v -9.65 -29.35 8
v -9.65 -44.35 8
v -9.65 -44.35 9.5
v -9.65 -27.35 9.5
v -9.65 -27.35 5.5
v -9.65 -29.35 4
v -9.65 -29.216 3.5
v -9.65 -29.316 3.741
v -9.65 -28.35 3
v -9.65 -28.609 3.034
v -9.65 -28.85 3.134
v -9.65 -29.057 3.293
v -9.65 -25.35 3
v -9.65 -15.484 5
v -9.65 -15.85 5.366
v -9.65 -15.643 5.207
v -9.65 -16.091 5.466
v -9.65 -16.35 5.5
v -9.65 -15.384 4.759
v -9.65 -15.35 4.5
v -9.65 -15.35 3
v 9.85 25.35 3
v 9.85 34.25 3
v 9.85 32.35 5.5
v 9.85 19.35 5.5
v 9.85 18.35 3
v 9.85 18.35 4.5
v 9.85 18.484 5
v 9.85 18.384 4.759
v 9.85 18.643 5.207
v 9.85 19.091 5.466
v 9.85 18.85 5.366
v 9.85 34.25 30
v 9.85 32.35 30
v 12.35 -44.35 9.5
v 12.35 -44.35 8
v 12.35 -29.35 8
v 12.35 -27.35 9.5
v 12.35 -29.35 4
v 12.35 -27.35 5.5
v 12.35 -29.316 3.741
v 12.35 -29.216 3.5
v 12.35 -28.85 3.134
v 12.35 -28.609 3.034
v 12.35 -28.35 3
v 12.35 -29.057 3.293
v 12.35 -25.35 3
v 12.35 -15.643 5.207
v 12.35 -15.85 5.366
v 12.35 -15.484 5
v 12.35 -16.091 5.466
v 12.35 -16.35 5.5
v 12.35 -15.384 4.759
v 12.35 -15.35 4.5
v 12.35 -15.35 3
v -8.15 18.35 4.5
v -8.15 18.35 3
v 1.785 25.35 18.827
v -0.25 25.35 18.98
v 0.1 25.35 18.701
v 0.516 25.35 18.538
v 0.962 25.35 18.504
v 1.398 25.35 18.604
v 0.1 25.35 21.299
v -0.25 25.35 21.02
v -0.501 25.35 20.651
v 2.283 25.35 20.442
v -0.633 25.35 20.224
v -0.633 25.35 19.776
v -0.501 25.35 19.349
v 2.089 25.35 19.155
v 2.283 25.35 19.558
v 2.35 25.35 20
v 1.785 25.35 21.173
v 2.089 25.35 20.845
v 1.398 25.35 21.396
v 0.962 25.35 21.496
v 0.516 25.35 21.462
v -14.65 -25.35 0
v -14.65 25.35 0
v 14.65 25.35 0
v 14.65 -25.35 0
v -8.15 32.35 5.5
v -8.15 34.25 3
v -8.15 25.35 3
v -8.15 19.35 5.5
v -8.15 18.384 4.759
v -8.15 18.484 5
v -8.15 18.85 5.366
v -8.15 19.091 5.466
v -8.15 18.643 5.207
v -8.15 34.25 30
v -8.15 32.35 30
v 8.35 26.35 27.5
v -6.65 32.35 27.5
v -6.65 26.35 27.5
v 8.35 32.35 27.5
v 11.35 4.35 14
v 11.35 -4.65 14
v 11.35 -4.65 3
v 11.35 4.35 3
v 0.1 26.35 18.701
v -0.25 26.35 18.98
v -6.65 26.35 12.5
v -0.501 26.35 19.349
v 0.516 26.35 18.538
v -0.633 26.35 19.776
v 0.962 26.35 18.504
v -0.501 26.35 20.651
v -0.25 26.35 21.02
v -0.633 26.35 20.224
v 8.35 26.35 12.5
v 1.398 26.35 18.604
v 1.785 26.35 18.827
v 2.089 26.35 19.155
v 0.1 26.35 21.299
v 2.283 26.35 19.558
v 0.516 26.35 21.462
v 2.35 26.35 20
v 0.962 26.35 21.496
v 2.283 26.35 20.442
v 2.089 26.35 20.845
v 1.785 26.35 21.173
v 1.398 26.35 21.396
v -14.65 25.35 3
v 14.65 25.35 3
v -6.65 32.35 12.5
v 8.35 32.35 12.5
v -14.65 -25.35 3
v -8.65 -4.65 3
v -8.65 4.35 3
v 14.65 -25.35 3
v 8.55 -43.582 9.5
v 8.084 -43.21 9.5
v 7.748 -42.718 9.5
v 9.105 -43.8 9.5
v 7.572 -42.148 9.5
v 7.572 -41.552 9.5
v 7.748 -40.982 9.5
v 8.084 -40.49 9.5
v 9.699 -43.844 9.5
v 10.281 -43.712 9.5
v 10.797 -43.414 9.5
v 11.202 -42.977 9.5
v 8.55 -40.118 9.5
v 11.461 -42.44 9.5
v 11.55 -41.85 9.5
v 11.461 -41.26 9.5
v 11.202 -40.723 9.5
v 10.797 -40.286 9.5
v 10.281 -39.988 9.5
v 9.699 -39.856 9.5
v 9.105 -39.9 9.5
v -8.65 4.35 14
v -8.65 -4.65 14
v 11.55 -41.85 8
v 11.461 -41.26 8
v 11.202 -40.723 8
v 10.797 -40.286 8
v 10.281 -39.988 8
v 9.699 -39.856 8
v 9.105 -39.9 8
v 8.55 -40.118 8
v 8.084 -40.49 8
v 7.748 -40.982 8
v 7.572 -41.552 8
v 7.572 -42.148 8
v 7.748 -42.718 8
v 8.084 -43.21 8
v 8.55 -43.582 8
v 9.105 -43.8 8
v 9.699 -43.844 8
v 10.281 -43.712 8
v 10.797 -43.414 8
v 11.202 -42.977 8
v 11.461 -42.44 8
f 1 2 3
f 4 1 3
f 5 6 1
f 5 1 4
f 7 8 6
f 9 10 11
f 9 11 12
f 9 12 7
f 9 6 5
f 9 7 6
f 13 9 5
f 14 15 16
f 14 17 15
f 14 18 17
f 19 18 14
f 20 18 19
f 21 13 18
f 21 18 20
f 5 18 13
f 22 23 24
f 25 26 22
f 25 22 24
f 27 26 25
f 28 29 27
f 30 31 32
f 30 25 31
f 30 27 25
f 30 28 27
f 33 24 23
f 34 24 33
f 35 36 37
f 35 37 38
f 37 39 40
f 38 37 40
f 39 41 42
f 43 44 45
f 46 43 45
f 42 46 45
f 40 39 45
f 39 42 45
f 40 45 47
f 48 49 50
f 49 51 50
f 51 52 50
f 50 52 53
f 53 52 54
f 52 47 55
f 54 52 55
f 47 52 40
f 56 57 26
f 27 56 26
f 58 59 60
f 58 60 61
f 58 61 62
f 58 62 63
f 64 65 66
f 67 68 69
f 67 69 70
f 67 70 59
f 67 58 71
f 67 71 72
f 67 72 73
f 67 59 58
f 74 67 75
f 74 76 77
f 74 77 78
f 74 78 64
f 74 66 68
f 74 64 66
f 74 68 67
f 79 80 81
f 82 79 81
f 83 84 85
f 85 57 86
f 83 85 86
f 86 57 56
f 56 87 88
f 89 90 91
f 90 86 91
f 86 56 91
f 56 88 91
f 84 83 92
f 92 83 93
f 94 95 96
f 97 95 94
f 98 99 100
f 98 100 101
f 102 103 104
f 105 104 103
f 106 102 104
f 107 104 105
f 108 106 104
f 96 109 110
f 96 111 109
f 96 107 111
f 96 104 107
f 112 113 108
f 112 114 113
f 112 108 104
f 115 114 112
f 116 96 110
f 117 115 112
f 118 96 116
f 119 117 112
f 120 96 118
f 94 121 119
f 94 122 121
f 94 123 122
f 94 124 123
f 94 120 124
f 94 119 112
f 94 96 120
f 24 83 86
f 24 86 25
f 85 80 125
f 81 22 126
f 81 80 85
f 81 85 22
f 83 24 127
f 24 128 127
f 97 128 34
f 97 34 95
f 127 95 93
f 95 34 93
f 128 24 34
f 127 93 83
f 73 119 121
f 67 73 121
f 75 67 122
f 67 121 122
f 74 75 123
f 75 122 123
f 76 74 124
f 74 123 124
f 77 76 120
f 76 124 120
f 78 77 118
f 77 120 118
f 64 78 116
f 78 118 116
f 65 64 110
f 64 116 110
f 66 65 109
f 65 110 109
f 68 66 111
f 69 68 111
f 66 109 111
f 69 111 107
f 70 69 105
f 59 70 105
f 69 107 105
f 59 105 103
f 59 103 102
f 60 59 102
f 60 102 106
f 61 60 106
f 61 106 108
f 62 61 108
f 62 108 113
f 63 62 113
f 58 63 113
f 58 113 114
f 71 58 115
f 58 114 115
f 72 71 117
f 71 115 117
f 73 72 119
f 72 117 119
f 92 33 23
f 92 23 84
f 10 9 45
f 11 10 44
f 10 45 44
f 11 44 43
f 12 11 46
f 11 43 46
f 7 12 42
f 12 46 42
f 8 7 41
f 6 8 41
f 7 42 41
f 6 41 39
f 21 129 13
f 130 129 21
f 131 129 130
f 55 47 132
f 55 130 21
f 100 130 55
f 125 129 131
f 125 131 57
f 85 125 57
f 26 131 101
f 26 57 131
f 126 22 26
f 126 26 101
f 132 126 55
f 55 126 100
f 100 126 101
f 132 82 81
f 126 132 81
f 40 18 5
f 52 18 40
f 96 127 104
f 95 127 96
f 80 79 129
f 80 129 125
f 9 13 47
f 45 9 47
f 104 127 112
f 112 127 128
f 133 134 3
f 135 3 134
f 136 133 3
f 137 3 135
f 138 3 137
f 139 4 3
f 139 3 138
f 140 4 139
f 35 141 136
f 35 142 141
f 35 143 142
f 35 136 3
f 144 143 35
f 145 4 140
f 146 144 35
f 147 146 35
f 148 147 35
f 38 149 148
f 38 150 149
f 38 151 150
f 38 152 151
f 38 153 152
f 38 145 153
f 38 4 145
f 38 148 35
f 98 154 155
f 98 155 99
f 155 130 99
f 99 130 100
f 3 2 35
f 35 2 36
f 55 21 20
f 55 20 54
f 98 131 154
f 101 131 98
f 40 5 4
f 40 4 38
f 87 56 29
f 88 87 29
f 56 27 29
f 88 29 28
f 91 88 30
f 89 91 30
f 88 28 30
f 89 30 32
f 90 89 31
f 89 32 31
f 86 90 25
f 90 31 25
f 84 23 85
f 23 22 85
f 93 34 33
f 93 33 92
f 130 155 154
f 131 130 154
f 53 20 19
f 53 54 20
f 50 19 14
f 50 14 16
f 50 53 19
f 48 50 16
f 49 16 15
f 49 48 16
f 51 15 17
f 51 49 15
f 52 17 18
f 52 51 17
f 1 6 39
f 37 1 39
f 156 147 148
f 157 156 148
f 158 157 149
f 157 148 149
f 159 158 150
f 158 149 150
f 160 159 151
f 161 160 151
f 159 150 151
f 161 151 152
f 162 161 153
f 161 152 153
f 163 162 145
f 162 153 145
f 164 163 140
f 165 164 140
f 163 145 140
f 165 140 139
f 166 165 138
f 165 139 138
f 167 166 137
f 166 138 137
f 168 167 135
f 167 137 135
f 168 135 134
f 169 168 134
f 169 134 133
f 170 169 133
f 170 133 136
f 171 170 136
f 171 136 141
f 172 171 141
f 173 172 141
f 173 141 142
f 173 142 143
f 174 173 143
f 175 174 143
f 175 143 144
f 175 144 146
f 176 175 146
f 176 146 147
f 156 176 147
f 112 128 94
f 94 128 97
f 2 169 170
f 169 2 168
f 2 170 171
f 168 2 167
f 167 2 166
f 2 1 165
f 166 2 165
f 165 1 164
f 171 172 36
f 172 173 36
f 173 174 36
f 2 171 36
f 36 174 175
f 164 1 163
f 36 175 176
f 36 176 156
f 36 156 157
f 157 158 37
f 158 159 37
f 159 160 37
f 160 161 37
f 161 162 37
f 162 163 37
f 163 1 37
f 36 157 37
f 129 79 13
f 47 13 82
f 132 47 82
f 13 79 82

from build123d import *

# Parameters (mm, degrees)
SKETCH_W      = 29.3
SKETCH_H      = 50.7
PAD_DEPTH     = 3
SKETCH001_W   = 18
SKETCH001_H   = 14
SKETCH001_W_2 = 22
PAD001_DEPTH  = 2.5
FILLET_R      = 1
SKETCH002_W   = 18
SKETCH002_H   = 27
PAD002_DEPTH  = 1.9
SKETCH003_W   = 15
SKETCH003_H   = 15
PAD003_DEPTH  = 6
SKETCH004_R   = 1.5
PAD004_DEPTH  = 1
SKETCH005_W   = 22
SKETCH005_H   = 2
PAD005_DEPTH  = 2.5
SKETCH006_W   = 22
SKETCH006_H   = 17
PAD006_DEPTH  = 1.5
SKETCH007_R   = 2
POCKET_DEPTH  = 5
SKETCH008_W   = 20
SKETCH008_H   = 9
PAD007_DEPTH  = 11
FILLET001_R   = 1


with BuildPart() as part:
    # Sketch → Pad (new body)
    with BuildSketch(Plane.XY):
        Rectangle(SKETCH_W, SKETCH_H)
    extrude(amount=PAD_DEPTH)

    # Sketch001 → Pad001 (new body)
    with BuildSketch(Plane.XY.offset(3)):
        with Locations((0.85, 25.35)):
            Rectangle(SKETCH001_W, SKETCH001_H)
        with Locations((1.35, -22.35)):
            Rectangle(SKETCH001_W_2, SKETCH001_H)
    extrude(amount=PAD001_DEPTH)

    # Fillet
    fillet_edges = [part.edges().sort_by_distance(p)[0] for p in [
        (0.85, 18.35, 5.5),
        (1.35, -15.35, 5.5),
    ]]
    fillet(fillet_edges, radius=FILLET_R)

    # Sketch002 → Pad002 (new body)
    with BuildSketch(Plane(origin=(0, 32.35, 0), x_dir=(-1, 0, 0), z_dir=(0, 1, 0))):
        with Locations((-0.85, 16.5)):
            Rectangle(SKETCH002_W, SKETCH002_H)
    extrude(amount=PAD002_DEPTH)

    # Sketch003 → Pad003 (new body)
    with BuildSketch(Plane.XZ.offset(-32.35)):
        with Locations((0.85, 20)):
            Rectangle(SKETCH003_W, SKETCH003_H)
    extrude(amount=PAD003_DEPTH)

    # Sketch004 → Pad004 (new body)
    with BuildSketch(Plane.XZ.offset(-26.35)):
        with Locations((0.85, 20)):
            Circle(SKETCH004_R)
    extrude(amount=PAD004_DEPTH)

    # Sketch005 → Pad005 (new body)
    with BuildSketch(Plane.XY.offset(5.5)):
        with Locations((1.35, -28.35)):
            Rectangle(SKETCH005_W, SKETCH005_H)
    extrude(amount=PAD005_DEPTH)

    # Sketch006 → Pad006 (new body)
    with BuildSketch(Plane.XY.offset(8)):
        with Locations((1.35, -35.85)):
            Rectangle(SKETCH006_W, SKETCH006_H)
    extrude(amount=PAD006_DEPTH)

    # Sketch007 → Pocket (cut)
    with BuildSketch(Plane.XY.offset(9.5)):
        with Locations((9.55, -41.85)):
            Circle(SKETCH007_R)
    extrude(amount=-POCKET_DEPTH, mode=Mode.SUBTRACT)

    # Sketch008 → Pad007 (new body)
    with BuildSketch(Plane.XY.offset(3)):
        with Locations((1.35, -0.15)):
            Rectangle(SKETCH008_W, SKETCH008_H)
    extrude(amount=PAD007_DEPTH)

    # Fillet001
    fillet001_edges = [part.edges().sort_by_distance(p)[0] for p in [
        (1.35, -29.35, 3),
    ]]
    fillet(fillet001_edges, radius=FILLET001_R)


solid = part.part
